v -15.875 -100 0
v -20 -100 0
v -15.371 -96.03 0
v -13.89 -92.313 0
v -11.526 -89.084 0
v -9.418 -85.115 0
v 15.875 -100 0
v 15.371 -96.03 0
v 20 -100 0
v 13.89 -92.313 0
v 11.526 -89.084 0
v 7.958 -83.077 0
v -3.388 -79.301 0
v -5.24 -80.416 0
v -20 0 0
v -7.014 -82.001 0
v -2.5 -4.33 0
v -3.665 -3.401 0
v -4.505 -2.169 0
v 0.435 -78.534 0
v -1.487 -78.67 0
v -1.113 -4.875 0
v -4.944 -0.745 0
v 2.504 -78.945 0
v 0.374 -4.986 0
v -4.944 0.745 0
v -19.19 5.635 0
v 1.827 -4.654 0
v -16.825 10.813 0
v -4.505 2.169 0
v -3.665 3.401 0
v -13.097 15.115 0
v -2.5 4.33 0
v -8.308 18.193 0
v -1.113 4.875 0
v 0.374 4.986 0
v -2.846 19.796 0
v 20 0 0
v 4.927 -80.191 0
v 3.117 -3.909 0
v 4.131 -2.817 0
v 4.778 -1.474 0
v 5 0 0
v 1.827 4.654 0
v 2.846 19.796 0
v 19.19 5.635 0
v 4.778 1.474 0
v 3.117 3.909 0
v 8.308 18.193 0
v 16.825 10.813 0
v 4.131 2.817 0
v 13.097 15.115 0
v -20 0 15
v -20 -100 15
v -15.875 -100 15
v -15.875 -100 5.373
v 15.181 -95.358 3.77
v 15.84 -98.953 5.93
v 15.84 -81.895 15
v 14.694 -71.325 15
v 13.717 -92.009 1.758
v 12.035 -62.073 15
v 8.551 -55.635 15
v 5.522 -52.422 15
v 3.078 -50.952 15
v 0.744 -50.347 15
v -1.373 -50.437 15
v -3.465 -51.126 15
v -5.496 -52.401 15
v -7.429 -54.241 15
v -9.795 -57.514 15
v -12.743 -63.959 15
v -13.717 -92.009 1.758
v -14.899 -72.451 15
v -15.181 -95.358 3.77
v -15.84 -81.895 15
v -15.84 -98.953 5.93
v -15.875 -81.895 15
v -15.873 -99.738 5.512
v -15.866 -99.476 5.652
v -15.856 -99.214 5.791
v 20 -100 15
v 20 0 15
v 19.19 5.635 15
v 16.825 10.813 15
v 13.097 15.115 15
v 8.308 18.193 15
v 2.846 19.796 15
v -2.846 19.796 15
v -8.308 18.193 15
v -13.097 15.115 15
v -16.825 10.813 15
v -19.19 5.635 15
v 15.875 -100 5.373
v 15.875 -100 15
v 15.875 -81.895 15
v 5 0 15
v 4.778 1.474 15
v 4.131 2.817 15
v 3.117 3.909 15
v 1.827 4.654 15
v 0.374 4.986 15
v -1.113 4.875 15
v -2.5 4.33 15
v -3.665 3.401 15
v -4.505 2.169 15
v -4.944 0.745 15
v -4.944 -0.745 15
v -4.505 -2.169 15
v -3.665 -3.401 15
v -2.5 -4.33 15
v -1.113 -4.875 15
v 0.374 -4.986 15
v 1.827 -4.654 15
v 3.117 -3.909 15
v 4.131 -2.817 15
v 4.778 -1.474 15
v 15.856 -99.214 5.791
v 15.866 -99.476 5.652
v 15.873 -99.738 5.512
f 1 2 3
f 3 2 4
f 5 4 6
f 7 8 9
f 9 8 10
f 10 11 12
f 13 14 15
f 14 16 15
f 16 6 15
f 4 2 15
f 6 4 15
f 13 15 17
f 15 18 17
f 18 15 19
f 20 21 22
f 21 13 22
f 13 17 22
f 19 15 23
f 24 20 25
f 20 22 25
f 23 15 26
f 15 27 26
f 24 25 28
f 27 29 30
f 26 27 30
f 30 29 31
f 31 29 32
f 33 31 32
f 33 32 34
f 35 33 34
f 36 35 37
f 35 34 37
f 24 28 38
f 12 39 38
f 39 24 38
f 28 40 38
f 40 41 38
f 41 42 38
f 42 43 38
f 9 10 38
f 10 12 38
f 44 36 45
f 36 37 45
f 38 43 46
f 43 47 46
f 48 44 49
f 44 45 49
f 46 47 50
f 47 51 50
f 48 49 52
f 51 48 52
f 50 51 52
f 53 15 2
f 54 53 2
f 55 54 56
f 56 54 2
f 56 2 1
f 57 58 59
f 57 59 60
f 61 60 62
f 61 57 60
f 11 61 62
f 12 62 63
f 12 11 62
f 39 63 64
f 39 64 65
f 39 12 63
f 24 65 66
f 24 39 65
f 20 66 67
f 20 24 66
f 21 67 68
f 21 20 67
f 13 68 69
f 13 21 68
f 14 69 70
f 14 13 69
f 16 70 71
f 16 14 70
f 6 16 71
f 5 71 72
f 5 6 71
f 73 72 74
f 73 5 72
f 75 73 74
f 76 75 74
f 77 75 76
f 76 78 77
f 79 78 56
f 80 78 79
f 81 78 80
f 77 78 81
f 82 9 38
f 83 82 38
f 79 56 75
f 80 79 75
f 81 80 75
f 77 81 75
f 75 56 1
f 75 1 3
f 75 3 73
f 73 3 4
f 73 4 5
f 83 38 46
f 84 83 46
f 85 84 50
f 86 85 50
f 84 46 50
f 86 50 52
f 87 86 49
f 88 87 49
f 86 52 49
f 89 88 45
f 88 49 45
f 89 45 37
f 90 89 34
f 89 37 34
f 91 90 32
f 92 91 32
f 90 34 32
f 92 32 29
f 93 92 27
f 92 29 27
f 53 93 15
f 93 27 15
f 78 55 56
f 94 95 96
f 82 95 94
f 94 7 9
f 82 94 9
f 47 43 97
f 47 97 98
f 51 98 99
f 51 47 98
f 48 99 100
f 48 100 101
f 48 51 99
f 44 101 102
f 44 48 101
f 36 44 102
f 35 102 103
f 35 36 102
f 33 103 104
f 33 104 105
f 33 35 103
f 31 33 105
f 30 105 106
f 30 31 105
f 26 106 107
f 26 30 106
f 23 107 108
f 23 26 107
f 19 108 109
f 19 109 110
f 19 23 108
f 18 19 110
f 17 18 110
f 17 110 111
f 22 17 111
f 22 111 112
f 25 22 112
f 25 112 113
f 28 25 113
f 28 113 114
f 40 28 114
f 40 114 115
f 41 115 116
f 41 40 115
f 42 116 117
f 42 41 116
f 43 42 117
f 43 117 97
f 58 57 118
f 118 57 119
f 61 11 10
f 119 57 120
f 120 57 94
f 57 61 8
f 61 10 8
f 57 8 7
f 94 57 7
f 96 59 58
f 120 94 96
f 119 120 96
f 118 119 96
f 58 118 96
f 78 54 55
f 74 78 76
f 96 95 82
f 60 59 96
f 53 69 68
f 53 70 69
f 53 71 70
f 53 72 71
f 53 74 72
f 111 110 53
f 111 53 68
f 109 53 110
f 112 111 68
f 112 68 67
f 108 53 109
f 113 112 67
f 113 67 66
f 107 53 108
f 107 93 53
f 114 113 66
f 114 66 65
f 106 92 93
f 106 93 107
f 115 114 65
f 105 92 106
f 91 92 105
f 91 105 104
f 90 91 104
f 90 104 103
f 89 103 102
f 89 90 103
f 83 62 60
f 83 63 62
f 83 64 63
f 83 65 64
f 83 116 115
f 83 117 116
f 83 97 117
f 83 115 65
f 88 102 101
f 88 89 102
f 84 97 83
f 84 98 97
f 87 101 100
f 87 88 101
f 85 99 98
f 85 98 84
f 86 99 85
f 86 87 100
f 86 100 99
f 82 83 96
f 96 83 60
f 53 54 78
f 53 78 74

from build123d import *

# Parameters (mm, degrees)
SKETCH1_R           = 5
BOSS_EXTRUDE1_DEPTH = 15
SKETCH2_R           = 15.875
CUT_EXTRUDE1_DEPTH  = 64
SKETCH4_W           = 31.75
SKETCH4_H           = 8.5
CUT_EXTRUDE2_DEPTH  = 61


with BuildPart() as part:
    # Sketch1 → Boss-Extrude1 (new body)
    with BuildSketch(Plane.XY):
        with BuildLine():
            Line((-20, 0), (-20, -100))
            Line((-20, -100), (-15.875, -100))
            ThreePointArc((-15.875, -100), (0, -84.125), (15.875, -100))
            Line((15.875, -100), (20, -100))
            Line((20, -100), (20, 0))
            ThreePointArc((20, 0), (0, 20), (-20, 0))
        make_face()
        Circle(SKETCH1_R, mode=Mode.SUBTRACT)
    extrude(amount=BOSS_EXTRUDE1_DEPTH)

    # Sketch2 → Cut-Extrude1 (cut)
    with BuildSketch(Plane(origin=(0, -77.959645174, -41.451878628), x_dir=(1, 0, 0), z_dir=(0, 0.8829475928589248, 0.46947156278589486))):
        with Locations((0, -52.738509112)):
            Circle(SKETCH2_R)
    extrude(amount=CUT_EXTRUDE1_DEPTH, mode=Mode.SUBTRACT)

    # Sketch4 → Cut-Extrude2 (cut)
    with BuildSketch(Plane(origin=(0, -77.959645174, -41.451878628), x_dir=(1, 0, 0), z_dir=(0, 0.8829475928589248, 0.46947156278589486))):
        with Locations((0, -55.941370171)):
            Rectangle(SKETCH4_W, SKETCH4_H)
    extrude(amount=CUT_EXTRUDE2_DEPTH, mode=Mode.SUBTRACT)


solid = part.part
